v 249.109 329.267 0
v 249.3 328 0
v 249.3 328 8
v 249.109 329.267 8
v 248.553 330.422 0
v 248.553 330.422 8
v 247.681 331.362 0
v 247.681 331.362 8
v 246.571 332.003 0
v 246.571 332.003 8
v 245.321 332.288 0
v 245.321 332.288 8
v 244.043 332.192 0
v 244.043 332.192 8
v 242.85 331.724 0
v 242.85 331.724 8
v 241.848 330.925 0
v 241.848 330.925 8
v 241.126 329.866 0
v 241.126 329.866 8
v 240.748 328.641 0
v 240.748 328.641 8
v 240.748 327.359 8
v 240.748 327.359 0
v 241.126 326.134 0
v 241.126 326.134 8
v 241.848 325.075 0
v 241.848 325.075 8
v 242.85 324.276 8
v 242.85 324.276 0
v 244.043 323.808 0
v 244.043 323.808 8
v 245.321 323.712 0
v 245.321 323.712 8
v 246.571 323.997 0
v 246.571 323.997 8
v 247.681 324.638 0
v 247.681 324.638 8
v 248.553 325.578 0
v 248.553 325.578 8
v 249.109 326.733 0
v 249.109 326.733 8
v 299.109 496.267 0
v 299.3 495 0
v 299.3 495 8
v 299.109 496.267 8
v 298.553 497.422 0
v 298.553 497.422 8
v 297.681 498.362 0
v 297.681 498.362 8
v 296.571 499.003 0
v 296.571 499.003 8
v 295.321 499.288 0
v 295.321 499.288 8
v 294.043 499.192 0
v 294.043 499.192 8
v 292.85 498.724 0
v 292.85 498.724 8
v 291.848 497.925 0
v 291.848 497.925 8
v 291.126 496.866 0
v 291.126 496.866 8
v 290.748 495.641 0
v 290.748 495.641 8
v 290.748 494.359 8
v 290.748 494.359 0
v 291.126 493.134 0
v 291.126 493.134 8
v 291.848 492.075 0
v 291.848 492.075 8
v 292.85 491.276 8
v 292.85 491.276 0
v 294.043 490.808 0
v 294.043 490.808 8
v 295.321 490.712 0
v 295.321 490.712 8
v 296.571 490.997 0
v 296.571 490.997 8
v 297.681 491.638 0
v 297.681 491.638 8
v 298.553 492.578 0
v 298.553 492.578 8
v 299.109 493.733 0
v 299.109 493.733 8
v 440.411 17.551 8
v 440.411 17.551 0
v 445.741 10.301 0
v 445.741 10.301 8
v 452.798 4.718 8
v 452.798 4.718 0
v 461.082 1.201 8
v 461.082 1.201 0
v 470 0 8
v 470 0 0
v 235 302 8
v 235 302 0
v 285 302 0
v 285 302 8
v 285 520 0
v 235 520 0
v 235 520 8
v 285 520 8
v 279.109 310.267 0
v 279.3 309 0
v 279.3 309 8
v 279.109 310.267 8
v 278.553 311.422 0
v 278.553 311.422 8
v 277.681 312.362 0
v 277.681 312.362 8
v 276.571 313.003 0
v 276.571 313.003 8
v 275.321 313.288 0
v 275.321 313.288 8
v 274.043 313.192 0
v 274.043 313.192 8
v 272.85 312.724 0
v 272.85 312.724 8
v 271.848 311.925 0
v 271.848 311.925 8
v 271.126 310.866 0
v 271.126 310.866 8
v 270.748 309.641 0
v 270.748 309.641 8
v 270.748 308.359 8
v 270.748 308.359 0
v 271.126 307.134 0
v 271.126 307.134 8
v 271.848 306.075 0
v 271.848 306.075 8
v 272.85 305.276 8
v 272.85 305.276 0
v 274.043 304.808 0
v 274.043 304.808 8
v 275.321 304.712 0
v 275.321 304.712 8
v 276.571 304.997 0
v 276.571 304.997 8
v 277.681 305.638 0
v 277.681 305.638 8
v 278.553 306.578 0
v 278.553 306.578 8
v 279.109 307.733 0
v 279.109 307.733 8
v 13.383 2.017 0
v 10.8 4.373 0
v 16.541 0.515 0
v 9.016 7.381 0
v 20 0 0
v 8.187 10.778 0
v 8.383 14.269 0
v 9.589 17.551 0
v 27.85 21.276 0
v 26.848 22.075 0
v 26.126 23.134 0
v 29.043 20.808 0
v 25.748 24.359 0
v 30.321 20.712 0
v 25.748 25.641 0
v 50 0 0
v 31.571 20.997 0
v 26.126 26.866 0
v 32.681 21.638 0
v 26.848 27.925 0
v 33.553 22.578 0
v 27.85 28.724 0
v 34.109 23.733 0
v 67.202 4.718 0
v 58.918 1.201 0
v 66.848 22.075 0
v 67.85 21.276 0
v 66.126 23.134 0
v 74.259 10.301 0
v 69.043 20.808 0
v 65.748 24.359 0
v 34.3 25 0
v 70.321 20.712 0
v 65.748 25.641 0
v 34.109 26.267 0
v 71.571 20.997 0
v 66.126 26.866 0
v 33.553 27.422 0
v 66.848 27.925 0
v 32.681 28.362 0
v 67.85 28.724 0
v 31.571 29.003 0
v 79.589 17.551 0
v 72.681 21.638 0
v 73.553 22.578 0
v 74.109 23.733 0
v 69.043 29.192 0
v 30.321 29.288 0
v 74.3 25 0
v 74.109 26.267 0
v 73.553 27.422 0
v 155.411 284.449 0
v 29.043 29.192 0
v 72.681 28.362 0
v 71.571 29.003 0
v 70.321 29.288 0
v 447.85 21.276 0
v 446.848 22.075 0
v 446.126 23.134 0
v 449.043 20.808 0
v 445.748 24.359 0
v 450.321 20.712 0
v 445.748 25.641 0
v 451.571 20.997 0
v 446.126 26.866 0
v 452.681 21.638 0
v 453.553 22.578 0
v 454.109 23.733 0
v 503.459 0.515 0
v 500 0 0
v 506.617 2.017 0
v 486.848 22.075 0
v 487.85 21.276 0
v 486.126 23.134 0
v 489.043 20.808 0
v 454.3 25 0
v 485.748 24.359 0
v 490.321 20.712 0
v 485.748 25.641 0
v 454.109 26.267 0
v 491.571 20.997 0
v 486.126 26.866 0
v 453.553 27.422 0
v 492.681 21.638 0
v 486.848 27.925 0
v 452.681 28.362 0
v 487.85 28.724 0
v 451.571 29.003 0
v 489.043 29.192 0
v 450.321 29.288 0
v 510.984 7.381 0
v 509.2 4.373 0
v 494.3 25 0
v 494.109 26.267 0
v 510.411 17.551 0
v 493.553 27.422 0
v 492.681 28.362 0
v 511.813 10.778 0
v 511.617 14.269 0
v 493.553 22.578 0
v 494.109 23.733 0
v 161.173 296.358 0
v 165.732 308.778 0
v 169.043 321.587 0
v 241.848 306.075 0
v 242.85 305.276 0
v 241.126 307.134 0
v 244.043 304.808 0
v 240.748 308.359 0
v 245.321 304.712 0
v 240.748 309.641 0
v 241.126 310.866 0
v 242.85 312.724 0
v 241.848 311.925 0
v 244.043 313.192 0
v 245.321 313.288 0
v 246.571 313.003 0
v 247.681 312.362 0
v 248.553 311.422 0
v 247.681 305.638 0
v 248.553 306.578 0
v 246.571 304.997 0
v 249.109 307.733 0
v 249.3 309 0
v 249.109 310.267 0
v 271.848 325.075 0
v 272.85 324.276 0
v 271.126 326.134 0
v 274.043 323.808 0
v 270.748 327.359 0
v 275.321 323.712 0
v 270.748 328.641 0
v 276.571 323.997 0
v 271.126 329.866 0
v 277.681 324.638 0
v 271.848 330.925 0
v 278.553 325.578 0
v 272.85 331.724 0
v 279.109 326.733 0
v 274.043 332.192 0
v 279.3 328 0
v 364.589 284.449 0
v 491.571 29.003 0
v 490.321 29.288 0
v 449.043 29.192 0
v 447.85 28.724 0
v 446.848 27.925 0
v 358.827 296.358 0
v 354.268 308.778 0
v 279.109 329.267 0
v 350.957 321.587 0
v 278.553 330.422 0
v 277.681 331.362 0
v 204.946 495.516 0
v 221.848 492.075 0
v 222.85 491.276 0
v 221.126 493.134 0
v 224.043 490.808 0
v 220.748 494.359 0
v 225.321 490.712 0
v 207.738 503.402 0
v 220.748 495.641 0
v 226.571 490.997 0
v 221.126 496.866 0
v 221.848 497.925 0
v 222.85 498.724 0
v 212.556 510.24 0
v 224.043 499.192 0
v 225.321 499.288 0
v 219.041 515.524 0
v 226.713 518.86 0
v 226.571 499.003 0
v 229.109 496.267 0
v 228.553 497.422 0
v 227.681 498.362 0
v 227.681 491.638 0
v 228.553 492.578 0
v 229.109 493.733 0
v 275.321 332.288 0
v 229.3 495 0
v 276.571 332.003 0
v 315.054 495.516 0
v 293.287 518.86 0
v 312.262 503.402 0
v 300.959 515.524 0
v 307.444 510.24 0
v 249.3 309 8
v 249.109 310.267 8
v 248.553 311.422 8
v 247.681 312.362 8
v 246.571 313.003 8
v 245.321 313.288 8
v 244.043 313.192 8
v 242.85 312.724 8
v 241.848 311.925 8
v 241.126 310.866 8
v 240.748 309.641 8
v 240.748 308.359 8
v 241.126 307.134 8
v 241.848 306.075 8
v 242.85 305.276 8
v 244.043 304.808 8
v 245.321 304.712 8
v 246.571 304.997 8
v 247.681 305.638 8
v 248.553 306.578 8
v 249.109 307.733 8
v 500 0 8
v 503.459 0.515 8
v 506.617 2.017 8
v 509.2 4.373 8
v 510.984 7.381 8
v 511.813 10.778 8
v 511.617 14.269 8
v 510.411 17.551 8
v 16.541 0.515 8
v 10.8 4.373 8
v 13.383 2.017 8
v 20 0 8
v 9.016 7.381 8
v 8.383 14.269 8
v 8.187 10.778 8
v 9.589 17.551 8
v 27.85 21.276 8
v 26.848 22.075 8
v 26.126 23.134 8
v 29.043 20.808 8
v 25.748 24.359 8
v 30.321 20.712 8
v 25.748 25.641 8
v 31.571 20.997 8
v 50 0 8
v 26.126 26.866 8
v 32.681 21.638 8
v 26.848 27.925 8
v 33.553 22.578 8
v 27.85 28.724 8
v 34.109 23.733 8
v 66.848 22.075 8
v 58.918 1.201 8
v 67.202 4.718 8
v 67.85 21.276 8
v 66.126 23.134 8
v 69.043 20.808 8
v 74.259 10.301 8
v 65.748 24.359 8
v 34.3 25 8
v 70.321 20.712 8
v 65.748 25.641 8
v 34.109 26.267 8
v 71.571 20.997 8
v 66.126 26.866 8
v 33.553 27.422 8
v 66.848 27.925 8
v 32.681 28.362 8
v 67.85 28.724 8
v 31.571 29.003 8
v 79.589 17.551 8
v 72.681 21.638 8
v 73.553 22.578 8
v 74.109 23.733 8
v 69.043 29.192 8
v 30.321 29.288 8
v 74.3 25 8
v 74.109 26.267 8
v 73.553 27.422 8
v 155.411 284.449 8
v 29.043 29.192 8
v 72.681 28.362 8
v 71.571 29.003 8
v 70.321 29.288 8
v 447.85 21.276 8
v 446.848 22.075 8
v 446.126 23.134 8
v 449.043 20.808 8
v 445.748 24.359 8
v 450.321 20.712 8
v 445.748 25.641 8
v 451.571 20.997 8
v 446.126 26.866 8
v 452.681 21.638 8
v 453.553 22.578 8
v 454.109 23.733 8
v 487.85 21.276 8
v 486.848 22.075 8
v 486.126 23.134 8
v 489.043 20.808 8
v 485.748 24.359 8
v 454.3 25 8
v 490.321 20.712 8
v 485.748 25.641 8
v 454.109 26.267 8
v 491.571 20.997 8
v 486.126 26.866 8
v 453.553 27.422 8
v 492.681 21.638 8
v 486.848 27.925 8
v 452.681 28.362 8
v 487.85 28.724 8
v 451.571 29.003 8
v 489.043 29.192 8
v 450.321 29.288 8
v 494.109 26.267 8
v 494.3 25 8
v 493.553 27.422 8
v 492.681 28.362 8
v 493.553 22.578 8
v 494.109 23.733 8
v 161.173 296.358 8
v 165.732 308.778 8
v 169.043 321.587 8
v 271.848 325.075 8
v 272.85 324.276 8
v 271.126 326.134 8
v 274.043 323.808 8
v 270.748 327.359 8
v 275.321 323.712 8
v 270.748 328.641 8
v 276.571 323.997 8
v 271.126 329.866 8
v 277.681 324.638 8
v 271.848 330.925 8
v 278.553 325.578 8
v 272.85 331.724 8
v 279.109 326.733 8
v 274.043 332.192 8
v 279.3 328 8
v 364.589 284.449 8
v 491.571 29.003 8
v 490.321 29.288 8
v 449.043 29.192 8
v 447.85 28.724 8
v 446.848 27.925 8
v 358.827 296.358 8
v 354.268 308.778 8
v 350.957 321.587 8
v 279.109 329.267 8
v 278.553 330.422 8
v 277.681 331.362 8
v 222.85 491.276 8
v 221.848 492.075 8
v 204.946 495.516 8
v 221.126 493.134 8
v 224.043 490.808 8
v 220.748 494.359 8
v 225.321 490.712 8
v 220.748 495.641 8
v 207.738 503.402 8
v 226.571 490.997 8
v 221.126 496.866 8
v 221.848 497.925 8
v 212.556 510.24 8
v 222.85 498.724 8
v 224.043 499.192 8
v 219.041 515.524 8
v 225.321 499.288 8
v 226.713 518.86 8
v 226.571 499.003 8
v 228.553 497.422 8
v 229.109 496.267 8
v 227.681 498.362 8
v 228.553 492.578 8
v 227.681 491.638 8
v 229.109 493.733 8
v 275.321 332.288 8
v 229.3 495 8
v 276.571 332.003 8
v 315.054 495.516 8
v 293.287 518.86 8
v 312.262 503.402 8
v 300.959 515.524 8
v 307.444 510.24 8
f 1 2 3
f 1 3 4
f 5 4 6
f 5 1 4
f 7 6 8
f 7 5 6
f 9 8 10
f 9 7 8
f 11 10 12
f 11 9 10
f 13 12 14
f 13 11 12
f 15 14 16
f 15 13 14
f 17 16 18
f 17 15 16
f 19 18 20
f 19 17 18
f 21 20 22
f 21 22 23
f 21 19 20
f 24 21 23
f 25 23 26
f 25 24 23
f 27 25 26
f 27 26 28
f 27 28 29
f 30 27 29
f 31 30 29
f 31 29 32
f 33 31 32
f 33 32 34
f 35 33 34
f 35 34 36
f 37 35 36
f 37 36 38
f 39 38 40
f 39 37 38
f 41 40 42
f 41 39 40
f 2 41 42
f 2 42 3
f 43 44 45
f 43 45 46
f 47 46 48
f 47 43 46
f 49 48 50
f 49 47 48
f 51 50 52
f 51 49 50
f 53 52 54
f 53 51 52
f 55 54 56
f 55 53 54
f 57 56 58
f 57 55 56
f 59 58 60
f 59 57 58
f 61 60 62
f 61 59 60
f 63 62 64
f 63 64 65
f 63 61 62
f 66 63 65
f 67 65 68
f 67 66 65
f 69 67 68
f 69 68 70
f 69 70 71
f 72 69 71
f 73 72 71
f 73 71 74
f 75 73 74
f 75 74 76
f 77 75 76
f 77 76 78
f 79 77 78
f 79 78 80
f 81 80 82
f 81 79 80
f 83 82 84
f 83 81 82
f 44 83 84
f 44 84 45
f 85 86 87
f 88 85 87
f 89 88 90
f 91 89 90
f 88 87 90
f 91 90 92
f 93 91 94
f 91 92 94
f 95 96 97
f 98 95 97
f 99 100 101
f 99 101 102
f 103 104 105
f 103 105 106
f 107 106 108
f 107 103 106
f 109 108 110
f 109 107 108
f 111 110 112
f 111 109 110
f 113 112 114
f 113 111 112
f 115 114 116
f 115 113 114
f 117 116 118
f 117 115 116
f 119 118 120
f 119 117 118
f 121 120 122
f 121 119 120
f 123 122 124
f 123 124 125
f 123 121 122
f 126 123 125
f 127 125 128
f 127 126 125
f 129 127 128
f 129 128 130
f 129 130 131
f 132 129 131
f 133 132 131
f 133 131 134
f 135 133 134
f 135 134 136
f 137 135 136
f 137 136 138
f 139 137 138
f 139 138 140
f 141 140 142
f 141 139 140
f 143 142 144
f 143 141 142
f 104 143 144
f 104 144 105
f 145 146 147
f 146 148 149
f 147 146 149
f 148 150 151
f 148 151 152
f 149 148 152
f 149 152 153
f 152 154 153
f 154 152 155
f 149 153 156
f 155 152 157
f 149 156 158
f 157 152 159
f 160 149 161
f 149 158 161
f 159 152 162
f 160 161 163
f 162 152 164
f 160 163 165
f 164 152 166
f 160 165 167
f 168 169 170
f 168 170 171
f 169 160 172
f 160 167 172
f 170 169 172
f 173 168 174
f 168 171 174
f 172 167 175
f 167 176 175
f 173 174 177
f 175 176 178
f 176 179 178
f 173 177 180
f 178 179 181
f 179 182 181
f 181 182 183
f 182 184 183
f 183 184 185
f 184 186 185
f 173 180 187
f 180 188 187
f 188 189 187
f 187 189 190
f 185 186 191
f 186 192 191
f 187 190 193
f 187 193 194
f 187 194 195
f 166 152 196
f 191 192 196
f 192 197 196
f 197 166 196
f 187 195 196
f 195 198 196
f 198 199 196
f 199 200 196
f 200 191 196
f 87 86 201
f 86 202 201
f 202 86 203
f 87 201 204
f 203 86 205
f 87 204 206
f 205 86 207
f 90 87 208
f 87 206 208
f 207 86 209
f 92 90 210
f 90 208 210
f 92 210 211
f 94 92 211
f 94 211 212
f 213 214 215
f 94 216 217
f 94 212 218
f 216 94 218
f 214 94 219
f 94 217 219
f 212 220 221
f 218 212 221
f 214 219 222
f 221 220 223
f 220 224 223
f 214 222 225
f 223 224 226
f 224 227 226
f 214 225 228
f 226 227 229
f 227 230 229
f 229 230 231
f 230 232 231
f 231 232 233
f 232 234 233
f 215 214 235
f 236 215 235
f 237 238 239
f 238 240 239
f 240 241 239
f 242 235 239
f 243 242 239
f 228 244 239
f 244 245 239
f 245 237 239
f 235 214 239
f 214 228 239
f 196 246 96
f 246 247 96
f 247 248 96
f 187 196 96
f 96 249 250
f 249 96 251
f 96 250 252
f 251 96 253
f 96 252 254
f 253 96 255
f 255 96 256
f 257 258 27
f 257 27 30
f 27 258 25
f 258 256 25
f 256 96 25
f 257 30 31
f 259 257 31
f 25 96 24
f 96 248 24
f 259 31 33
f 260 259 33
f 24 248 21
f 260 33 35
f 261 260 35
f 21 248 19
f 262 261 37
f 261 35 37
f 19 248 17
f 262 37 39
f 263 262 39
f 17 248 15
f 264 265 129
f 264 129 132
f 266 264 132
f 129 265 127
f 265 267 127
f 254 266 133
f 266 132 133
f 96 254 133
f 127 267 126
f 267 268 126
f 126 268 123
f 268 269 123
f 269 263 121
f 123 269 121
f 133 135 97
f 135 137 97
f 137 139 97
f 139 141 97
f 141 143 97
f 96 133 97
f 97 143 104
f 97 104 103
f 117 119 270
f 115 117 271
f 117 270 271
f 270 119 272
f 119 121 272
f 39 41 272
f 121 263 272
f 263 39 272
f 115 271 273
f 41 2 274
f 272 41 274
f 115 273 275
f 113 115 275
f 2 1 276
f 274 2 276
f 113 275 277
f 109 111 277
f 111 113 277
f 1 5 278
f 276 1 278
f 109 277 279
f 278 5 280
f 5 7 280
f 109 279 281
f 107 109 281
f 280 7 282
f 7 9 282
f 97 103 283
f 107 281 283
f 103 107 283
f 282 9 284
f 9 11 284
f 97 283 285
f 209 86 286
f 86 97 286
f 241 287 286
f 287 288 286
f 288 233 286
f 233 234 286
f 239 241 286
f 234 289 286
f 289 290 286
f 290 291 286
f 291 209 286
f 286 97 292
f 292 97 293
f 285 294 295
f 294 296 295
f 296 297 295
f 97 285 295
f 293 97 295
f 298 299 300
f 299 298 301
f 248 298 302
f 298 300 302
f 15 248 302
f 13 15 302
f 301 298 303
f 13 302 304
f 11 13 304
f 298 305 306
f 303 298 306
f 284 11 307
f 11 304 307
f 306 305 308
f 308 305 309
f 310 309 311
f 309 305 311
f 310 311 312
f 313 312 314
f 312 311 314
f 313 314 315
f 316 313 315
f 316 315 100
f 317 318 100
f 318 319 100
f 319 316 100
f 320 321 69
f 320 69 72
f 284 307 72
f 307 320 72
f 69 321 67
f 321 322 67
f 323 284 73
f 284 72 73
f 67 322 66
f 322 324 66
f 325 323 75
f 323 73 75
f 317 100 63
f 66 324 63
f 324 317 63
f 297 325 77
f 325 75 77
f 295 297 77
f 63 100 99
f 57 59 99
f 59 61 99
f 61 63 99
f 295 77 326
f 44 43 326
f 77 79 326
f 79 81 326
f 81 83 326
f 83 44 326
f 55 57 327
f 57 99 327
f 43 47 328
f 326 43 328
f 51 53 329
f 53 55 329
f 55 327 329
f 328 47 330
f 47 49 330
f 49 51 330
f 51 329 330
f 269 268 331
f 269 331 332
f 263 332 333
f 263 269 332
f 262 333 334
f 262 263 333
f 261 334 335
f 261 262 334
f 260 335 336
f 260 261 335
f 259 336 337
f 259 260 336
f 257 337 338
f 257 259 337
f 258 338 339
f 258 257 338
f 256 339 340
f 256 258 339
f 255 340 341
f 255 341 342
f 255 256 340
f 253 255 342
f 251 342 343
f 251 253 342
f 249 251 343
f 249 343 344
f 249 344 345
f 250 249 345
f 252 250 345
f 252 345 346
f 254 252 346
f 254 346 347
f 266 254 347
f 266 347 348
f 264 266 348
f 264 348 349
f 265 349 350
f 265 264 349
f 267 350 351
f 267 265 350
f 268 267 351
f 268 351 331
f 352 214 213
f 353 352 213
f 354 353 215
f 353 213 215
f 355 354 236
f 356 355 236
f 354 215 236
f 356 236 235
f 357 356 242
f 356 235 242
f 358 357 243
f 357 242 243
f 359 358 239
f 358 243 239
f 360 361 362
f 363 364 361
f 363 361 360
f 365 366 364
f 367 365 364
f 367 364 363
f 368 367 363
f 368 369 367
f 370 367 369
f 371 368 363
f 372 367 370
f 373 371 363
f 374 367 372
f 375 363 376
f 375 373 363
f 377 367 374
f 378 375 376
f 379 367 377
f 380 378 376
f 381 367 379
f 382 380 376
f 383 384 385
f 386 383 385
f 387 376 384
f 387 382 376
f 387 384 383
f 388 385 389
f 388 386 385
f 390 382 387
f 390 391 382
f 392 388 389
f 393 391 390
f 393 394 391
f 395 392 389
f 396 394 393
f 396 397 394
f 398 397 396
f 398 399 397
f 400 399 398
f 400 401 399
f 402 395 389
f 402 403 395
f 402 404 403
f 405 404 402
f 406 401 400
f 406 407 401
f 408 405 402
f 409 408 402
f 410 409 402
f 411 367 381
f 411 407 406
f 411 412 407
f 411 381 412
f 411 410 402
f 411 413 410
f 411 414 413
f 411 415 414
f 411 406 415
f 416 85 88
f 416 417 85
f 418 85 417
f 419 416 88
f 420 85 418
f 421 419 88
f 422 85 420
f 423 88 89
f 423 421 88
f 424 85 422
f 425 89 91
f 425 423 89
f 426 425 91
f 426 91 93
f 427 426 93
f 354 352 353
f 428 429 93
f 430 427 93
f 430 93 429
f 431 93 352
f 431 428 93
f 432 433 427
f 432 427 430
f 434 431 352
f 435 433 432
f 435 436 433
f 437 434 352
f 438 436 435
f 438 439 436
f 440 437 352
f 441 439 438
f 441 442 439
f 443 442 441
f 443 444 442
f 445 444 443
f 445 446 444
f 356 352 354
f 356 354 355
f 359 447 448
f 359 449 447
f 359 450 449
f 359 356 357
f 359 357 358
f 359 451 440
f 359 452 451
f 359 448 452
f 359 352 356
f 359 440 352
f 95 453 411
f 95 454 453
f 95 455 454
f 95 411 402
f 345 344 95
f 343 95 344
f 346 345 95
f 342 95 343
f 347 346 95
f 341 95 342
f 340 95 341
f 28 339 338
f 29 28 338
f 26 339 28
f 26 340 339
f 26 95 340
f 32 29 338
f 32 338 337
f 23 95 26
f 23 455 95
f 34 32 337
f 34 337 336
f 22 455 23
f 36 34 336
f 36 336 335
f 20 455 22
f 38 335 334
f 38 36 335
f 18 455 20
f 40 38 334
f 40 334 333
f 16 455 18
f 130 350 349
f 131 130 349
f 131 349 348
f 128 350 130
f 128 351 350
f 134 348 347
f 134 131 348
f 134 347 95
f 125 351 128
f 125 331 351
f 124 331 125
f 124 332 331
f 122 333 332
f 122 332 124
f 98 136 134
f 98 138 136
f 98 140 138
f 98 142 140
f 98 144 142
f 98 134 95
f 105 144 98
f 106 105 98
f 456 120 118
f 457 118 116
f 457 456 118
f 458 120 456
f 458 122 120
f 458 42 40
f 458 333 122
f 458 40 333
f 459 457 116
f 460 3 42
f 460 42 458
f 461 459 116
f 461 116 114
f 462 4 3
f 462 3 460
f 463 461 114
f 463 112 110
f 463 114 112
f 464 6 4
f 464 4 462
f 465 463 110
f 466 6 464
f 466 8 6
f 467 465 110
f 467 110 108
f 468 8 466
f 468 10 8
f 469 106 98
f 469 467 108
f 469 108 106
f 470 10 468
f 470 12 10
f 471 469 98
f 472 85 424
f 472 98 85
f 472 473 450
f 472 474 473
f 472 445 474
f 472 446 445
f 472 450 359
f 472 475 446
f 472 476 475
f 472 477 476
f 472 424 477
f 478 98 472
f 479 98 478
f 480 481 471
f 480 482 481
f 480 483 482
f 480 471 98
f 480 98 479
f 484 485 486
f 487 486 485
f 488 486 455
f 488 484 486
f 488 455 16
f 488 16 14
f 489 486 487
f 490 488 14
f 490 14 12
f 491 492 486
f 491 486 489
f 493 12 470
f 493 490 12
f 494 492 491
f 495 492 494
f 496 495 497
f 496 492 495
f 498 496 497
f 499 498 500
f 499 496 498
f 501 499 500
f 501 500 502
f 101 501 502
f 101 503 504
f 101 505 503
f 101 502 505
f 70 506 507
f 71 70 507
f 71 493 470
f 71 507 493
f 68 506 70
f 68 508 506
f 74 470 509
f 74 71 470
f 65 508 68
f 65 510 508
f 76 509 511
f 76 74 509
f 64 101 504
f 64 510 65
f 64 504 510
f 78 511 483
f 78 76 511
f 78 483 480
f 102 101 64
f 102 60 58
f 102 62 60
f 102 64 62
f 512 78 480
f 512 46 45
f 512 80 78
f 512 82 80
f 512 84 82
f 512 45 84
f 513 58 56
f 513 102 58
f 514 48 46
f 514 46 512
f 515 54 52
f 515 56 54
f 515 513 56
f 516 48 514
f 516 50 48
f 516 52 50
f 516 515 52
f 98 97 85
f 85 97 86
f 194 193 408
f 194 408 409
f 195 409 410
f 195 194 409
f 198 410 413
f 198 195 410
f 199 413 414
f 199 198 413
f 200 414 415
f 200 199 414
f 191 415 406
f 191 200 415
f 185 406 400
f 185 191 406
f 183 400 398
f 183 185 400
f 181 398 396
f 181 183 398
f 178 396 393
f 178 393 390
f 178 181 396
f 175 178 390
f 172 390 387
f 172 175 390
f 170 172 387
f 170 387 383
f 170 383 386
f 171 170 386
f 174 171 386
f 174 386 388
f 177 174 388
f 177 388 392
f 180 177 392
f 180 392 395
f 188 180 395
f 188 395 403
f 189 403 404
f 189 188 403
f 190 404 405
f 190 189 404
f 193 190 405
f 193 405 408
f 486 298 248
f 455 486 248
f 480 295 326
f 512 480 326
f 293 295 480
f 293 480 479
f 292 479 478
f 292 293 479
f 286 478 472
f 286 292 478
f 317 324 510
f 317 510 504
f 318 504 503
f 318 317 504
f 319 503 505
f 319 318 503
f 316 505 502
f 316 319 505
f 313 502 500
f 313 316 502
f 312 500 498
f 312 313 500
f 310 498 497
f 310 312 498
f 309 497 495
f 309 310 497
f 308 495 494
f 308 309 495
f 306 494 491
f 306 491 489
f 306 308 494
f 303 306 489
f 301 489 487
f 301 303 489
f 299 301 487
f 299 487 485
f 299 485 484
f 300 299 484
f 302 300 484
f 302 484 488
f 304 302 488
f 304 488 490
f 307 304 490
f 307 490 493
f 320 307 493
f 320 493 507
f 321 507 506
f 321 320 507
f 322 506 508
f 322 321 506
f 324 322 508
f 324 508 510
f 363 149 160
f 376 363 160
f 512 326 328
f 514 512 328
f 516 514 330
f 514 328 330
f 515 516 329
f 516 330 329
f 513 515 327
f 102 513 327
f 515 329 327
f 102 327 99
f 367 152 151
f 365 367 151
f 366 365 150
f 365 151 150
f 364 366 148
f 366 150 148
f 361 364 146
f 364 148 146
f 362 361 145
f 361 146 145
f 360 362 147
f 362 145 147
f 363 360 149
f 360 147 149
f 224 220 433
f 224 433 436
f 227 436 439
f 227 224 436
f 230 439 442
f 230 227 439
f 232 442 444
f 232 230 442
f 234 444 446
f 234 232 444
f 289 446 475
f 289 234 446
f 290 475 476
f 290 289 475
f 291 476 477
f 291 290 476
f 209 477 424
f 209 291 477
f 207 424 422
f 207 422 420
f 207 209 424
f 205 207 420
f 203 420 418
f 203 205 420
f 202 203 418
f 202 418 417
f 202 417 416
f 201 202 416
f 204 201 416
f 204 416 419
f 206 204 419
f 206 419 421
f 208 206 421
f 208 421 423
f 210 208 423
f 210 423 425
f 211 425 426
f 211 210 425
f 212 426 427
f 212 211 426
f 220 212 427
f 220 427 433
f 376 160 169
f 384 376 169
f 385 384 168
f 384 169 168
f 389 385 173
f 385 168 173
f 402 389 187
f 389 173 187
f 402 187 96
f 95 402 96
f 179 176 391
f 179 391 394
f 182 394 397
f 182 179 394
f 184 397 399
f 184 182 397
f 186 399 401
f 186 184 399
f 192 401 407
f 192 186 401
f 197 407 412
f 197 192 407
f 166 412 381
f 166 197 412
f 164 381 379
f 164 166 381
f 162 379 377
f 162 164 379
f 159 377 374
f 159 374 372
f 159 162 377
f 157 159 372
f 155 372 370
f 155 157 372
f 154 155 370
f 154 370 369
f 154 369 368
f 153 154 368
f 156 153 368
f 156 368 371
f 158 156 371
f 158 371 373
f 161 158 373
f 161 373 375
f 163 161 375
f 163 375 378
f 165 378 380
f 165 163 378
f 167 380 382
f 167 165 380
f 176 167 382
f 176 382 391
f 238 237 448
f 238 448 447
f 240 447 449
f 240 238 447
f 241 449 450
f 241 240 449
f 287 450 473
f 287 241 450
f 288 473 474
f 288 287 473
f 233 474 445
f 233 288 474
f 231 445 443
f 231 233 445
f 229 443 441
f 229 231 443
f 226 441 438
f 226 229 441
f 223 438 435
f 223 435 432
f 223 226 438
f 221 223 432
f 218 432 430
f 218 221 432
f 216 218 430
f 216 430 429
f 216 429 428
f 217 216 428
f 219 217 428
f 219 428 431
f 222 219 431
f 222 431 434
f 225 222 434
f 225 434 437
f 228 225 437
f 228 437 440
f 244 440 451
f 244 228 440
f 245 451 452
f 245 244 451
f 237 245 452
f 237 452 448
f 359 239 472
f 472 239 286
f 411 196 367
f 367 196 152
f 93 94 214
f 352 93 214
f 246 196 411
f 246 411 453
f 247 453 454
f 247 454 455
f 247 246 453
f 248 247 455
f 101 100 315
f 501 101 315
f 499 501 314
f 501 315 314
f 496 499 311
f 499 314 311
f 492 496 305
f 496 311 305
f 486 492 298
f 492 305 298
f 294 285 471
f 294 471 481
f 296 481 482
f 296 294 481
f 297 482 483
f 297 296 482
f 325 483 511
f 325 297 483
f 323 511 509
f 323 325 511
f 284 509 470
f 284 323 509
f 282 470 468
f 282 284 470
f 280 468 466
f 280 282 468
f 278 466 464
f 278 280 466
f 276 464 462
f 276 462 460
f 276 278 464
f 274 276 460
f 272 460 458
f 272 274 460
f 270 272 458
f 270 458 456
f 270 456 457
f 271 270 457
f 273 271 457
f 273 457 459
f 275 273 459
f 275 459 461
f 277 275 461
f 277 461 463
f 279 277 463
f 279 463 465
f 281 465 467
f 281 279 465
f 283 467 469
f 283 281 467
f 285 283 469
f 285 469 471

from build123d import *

# Parameters (mm, degrees)
SKETCH_R  = 4.3
PAD_DEPTH = 8


with BuildPart() as part:
    # Sketch → Pad (new body)
    with BuildSketch(Plane.XY):
        with BuildLine():
            Line((20, 0), (50, 0))
            ThreePointArc((50, 0), (67.201528, 4.717883), (79.589256, 17.551244))
            Line((79.589256, 17.551244), (235, 302))
            Line((235, 302), (285, 302))
            Line((285, 302), (440.410744, 17.551244))
            ThreePointArc((440.410744, 17.551244), (452.798472, 4.717883), (470, 0))
            Line((470, 0), (500, 0))
            ThreePointArc((500, 0), (510.203305, 5.811034), (510.410744, 17.551244))
            Line((510.410744, 17.551244), (364.589256, 284.448756))
            ThreePointArc((350.956802, 321.58705), (356.39416, 302.511758), (364.589256, 284.448756))
            Line((350.956802, 321.58705), (315.053998, 495.516187))
            ThreePointArc((315.053998, 495.516187), (304.382337, 513.104291), (285, 520))
            Line((235, 520), (285, 520))
            ThreePointArc((235, 520), (215.617663, 513.104291), (204.946002, 495.516187))
            Line((204.946002, 495.516187), (169.043198, 321.58705))
            ThreePointArc((155.410744, 284.448756), (163.60584, 302.511758), (169.043198, 321.58705))
            Line((155.410744, 284.448756), (9.589256, 17.551244))
            ThreePointArc((9.589256, 17.551244), (9.796695, 5.811034), (20, 0))
        make_face()
        with Locations((245, 328)):
            Circle(SKETCH_R, mode=Mode.SUBTRACT)
        with Locations((275, 328)):
            Circle(SKETCH_R, mode=Mode.SUBTRACT)
        with Locations((275, 309)):
            Circle(SKETCH_R, mode=Mode.SUBTRACT)
        with Locations((245, 309)):
            Circle(SKETCH_R, mode=Mode.SUBTRACT)
        with Locations((490, 25)):
            Circle(SKETCH_R, mode=Mode.SUBTRACT)
        with Locations((450, 25)):
            Circle(SKETCH_R, mode=Mode.SUBTRACT)
        with Locations((70, 25)):
            Circle(SKETCH_R, mode=Mode.SUBTRACT)
        with Locations((30, 25)):
            Circle(SKETCH_R, mode=Mode.SUBTRACT)
        with Locations((225, 495)):
            Circle(SKETCH_R, mode=Mode.SUBTRACT)
        with Locations((295, 495)):
            Circle(SKETCH_R, mode=Mode.SUBTRACT)
    extrude(amount=PAD_DEPTH)


solid = part.part
